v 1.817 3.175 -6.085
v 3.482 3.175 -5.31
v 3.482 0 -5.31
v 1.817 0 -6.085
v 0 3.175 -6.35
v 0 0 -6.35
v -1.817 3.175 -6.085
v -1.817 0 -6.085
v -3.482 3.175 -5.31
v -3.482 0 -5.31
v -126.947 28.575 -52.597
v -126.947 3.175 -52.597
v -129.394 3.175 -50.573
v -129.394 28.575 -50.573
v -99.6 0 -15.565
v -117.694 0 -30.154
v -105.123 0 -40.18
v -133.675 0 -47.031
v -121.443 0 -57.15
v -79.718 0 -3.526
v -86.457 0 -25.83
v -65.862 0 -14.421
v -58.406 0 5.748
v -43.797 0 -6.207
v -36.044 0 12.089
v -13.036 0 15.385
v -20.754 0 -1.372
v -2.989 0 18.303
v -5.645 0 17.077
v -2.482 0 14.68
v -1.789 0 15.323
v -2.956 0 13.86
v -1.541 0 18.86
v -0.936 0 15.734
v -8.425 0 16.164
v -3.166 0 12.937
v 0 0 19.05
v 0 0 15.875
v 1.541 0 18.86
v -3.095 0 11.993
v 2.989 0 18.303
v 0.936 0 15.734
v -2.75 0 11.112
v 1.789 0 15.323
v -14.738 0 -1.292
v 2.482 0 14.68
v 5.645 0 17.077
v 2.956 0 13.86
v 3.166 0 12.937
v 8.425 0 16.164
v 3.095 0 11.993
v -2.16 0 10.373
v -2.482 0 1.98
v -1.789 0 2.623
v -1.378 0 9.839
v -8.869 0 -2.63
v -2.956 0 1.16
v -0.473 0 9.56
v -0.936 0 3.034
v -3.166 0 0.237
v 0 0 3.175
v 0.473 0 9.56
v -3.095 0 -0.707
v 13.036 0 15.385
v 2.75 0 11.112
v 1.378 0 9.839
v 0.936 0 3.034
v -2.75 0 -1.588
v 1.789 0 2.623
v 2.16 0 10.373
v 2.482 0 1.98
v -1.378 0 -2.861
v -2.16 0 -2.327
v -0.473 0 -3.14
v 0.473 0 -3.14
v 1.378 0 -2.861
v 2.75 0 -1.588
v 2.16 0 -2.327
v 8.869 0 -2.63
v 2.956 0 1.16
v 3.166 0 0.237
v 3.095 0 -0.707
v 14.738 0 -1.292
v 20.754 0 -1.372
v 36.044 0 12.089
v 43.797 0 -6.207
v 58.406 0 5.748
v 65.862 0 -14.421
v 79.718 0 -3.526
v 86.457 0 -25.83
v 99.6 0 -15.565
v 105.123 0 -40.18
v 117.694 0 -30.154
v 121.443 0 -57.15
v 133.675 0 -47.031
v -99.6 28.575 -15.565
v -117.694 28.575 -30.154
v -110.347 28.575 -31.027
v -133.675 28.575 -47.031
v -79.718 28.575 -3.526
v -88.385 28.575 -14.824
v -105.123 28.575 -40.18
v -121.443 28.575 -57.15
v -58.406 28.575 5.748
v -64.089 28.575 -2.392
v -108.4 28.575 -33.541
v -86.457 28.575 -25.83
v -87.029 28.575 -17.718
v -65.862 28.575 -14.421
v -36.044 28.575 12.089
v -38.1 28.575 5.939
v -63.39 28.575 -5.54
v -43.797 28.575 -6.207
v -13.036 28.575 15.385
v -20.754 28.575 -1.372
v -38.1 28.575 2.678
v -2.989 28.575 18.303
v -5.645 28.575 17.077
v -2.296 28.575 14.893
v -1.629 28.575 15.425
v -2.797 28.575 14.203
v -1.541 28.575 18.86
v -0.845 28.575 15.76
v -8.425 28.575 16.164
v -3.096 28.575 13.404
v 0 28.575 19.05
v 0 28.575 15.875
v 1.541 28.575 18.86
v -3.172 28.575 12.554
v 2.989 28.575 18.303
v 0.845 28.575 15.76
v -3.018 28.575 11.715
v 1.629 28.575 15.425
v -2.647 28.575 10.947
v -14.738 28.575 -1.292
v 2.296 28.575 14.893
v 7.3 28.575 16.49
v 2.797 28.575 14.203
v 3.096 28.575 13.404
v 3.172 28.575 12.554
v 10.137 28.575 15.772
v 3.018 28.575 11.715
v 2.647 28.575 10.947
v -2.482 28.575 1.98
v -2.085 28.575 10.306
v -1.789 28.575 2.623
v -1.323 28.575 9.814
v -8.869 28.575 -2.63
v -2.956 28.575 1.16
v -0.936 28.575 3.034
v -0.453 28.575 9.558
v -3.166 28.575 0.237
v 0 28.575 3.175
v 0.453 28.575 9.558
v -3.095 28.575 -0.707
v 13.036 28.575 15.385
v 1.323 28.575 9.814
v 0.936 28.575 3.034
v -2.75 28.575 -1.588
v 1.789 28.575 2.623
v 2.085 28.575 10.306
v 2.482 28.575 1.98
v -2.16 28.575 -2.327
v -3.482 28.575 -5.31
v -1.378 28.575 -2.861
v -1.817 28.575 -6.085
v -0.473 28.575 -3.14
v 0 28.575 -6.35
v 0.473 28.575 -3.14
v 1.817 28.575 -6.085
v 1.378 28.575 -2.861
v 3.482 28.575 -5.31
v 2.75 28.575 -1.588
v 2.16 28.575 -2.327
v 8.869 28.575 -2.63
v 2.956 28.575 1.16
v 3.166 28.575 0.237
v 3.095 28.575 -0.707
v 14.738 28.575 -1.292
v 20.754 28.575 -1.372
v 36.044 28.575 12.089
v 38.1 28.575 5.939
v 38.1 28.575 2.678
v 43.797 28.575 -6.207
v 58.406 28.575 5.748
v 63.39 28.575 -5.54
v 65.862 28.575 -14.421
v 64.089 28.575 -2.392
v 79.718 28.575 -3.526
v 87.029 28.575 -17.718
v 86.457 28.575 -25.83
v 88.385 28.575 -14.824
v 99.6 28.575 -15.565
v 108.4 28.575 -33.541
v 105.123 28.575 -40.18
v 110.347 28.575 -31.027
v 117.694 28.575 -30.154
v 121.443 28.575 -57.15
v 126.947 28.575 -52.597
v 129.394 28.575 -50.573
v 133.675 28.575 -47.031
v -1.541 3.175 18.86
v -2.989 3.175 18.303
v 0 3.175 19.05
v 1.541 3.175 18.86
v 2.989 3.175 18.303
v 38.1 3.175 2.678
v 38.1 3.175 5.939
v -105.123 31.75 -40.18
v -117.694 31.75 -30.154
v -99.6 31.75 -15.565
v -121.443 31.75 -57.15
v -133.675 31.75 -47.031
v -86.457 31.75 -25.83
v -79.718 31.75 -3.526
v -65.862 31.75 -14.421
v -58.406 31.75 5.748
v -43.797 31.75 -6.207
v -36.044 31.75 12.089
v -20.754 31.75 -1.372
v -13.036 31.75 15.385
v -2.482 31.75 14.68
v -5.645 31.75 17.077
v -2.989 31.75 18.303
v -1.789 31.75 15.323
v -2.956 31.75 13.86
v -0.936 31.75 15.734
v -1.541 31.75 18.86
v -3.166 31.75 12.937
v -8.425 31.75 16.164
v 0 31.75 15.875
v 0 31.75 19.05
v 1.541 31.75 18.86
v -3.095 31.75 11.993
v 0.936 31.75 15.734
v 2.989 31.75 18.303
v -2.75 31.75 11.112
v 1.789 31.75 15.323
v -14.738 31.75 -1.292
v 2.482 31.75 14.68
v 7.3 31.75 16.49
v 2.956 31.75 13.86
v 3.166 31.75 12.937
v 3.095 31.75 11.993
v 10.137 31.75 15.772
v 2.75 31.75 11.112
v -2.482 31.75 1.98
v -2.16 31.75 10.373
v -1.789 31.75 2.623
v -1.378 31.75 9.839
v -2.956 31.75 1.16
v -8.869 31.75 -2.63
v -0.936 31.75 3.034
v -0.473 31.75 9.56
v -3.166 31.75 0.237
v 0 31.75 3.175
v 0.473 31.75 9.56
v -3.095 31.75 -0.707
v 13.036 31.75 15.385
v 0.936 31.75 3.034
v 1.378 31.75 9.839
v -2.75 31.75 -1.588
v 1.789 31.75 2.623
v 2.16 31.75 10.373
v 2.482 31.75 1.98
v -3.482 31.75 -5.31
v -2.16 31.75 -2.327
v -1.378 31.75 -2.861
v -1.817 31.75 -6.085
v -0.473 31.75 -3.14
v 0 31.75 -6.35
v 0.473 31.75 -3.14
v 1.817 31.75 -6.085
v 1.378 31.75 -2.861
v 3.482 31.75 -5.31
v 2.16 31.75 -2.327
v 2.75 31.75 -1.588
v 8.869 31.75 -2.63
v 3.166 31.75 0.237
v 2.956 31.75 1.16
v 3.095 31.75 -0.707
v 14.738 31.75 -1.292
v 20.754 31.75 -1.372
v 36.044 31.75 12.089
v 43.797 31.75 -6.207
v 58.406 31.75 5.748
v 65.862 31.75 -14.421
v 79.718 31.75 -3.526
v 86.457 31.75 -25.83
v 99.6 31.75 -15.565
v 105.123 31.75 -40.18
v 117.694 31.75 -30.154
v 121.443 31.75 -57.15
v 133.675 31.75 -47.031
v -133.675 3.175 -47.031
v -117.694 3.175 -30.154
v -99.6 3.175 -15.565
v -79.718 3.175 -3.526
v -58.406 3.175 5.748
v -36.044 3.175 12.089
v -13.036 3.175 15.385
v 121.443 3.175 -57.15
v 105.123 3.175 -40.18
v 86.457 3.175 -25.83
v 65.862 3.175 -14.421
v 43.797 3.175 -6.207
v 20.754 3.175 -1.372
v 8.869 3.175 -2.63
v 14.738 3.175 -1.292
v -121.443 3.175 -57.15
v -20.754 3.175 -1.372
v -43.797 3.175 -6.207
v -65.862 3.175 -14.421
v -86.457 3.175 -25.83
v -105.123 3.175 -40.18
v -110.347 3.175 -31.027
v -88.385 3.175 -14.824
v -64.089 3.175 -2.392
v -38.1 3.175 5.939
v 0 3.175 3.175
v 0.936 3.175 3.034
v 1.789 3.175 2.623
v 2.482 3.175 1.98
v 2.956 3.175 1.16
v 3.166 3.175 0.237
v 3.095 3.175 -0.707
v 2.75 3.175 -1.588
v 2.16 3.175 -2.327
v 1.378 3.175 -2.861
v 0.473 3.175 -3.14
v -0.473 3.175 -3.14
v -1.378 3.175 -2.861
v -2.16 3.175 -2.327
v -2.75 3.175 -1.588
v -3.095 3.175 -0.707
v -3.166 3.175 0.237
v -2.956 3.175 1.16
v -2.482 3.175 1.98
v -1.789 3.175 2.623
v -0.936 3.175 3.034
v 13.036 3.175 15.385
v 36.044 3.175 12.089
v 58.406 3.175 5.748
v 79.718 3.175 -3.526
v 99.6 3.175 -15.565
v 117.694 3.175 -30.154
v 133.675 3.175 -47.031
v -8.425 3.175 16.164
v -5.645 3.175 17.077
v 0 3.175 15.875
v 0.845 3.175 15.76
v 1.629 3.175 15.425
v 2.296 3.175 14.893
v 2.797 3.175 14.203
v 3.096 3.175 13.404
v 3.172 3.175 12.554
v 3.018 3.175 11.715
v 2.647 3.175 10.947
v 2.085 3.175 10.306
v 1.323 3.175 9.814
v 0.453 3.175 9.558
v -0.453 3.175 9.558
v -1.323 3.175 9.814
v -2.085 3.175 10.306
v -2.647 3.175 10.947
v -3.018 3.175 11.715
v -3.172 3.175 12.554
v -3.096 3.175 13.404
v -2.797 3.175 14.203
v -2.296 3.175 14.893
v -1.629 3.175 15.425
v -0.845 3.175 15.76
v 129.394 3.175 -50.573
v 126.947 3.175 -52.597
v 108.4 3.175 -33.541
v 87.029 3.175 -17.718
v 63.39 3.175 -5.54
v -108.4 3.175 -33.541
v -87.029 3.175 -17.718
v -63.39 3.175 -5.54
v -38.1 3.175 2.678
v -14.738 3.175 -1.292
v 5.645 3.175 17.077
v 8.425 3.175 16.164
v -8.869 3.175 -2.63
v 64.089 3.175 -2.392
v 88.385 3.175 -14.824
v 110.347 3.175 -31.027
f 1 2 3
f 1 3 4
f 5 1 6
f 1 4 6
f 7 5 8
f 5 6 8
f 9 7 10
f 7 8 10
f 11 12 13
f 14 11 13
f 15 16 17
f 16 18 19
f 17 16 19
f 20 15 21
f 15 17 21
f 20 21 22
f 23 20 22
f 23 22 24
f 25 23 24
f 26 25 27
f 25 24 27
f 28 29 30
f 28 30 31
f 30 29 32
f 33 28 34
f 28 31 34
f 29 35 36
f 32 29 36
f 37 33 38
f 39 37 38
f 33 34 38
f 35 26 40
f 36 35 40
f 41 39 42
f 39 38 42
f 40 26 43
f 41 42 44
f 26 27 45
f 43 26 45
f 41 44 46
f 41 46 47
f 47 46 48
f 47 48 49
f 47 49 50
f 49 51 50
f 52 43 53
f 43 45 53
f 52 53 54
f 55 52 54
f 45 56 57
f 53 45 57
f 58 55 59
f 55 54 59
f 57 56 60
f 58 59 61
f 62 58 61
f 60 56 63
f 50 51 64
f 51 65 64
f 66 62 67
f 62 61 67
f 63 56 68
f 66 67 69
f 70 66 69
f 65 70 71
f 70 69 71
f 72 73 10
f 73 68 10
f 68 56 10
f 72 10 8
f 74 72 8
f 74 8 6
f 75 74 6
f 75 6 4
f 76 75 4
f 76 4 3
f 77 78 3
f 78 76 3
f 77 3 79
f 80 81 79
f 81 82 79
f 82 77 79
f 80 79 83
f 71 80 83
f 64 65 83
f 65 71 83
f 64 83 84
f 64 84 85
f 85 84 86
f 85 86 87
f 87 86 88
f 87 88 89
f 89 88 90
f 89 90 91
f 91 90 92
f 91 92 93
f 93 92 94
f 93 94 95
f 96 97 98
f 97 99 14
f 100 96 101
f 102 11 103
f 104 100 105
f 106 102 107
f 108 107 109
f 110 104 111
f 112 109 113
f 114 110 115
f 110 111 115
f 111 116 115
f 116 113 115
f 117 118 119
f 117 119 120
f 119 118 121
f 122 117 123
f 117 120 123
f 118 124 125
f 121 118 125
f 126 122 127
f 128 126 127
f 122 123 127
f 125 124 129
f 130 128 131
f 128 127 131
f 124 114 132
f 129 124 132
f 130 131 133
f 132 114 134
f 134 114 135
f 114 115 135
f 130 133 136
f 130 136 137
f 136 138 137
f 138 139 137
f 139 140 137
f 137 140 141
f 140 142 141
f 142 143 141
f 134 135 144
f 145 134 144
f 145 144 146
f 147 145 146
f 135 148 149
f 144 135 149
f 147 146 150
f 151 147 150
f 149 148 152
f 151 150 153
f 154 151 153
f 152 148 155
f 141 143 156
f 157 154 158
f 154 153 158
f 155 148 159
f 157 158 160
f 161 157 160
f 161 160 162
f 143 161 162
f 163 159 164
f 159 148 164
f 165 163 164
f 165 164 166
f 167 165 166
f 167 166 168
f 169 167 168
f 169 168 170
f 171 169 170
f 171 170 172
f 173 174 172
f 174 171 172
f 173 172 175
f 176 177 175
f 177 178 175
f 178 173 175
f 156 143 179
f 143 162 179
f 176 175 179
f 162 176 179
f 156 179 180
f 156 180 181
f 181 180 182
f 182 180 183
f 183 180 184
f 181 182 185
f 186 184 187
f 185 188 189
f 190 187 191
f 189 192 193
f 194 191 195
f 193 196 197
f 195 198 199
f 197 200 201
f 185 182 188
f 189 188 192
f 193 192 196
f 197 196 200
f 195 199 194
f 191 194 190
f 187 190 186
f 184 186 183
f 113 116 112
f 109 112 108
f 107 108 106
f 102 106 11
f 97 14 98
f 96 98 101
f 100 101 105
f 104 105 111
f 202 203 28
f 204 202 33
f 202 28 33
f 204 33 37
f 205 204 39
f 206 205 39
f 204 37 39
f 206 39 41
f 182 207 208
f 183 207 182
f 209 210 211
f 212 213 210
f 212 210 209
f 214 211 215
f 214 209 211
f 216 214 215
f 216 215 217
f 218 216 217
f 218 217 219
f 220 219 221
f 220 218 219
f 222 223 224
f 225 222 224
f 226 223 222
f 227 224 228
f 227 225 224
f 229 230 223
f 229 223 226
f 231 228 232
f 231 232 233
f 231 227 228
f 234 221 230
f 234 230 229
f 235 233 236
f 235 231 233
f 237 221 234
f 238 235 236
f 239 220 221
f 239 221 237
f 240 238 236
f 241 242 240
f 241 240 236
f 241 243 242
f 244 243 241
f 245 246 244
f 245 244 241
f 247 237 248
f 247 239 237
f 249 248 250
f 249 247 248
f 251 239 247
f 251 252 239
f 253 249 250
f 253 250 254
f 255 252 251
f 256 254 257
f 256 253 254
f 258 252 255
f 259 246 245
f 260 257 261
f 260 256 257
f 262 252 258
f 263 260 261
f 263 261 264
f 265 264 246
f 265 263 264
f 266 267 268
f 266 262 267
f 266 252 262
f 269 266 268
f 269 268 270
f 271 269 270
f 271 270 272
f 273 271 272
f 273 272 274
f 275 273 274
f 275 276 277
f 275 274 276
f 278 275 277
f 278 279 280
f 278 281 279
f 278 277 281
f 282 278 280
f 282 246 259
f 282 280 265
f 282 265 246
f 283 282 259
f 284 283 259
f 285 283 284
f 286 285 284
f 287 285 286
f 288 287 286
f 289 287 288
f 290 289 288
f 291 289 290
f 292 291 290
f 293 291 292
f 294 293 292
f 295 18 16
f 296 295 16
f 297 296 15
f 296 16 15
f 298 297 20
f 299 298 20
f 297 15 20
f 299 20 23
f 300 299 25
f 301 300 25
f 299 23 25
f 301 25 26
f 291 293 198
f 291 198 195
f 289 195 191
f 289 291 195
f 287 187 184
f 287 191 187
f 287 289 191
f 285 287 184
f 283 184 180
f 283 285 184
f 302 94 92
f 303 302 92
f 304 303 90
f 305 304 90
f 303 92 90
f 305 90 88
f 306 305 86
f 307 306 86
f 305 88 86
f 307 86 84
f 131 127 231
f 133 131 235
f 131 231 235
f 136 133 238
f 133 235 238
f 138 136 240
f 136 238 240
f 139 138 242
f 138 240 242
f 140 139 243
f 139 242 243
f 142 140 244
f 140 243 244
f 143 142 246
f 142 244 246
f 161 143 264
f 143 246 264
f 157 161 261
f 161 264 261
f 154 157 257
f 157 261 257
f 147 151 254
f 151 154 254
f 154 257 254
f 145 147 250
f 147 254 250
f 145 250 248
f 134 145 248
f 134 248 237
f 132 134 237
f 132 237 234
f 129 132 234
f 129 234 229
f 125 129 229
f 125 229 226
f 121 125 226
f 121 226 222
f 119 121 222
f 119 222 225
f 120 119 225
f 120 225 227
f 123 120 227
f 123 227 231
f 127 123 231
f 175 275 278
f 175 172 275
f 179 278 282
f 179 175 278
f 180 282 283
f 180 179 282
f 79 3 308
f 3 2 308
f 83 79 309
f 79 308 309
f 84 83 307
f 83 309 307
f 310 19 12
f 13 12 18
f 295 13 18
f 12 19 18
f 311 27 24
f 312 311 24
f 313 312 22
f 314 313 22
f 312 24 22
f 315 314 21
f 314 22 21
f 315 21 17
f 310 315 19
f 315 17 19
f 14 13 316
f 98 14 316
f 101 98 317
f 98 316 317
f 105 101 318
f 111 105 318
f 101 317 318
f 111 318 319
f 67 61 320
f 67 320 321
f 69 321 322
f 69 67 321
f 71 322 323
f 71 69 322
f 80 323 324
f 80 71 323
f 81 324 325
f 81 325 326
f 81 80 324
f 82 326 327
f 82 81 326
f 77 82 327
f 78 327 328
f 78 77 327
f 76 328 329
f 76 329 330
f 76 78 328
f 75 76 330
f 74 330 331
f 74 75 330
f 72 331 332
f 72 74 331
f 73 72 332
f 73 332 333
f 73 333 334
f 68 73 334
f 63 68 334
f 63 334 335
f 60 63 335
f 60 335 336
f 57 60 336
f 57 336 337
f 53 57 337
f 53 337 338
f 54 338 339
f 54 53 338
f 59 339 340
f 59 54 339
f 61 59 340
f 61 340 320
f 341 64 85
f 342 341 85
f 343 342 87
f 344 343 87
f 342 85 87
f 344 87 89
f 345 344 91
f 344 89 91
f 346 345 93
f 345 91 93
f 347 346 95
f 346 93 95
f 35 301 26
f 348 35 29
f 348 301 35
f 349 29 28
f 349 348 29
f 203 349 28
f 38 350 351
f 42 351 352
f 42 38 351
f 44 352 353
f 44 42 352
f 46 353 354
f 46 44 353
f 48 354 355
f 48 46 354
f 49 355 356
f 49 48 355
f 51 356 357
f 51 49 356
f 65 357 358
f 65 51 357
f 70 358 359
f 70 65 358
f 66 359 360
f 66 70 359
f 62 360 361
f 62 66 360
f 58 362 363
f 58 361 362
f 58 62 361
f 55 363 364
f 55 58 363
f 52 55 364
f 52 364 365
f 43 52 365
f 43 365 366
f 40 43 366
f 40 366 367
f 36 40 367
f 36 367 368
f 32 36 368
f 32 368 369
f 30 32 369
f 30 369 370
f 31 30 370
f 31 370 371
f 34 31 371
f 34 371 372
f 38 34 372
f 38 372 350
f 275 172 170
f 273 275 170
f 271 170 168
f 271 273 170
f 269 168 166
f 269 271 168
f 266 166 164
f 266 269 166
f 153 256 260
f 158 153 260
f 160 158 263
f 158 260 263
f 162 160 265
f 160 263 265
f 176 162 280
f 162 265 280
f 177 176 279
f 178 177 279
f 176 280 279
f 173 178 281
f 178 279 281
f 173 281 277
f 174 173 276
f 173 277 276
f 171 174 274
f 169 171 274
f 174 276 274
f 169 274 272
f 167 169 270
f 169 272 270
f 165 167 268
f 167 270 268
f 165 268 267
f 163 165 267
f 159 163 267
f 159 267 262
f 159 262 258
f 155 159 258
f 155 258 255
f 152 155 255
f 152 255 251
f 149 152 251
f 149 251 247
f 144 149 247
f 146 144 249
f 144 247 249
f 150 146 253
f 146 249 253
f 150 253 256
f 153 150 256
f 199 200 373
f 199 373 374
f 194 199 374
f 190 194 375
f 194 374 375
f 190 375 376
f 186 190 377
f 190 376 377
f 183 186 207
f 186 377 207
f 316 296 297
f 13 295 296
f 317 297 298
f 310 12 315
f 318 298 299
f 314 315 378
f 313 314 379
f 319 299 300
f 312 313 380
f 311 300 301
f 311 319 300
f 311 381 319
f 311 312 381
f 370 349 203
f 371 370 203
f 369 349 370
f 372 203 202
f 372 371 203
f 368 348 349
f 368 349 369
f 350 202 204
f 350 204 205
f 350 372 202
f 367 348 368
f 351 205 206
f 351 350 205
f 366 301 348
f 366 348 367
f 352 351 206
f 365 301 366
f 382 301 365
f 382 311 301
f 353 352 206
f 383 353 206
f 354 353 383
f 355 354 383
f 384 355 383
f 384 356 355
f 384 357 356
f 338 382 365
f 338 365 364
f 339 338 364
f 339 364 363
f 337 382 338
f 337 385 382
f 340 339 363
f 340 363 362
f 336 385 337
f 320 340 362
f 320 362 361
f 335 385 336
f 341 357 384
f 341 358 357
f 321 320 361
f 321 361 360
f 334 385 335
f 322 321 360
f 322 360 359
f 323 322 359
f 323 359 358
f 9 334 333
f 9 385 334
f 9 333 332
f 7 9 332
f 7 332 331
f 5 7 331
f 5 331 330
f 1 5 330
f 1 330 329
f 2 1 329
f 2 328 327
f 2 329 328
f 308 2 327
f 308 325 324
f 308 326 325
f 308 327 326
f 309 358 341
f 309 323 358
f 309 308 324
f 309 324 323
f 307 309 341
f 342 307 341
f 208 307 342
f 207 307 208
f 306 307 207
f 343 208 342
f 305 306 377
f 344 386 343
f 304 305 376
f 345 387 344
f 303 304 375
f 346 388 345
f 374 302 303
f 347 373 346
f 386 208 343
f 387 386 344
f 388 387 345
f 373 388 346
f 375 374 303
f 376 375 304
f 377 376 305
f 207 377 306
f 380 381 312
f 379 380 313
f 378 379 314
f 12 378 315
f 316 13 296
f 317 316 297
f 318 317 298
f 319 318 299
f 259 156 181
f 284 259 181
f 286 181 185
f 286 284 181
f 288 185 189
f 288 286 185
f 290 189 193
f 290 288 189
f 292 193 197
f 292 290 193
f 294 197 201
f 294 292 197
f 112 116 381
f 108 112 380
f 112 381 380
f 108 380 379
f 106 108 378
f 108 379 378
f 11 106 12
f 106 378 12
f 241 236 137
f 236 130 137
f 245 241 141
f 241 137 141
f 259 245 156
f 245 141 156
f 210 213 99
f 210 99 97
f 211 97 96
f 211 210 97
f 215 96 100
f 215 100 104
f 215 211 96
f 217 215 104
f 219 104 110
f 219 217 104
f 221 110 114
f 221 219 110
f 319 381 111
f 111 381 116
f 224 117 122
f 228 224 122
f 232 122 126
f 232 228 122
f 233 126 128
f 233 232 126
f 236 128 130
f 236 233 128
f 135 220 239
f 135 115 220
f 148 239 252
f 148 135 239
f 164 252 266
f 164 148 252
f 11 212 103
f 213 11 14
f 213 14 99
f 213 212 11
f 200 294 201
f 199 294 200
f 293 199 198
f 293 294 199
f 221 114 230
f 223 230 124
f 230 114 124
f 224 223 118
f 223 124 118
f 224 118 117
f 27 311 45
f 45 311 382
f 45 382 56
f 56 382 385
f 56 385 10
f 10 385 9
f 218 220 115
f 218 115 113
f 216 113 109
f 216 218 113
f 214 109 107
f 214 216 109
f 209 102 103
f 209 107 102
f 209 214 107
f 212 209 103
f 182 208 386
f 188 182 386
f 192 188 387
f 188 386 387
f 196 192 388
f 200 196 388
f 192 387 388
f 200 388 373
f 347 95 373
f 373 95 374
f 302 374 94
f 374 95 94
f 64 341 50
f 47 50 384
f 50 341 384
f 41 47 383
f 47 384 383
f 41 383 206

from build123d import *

# Parameters (mm, degrees)
SKETCH1_R           = 3.175
BOSS_EXTRUDE1_DEPTH = 3.175
BOSS_EXTRUDE2_DEPTH = 25.4
FILLET1_R           = 25.4
SKETCH4_W           = 38.1
SKETCH4_H           = 25.4
CUT_EXTRUDE1_DEPTH  = 254


# Read off the part's stored shape, not the designer's step: Boss-Extrude2
with BuildPart() as part:
    # Sketch1 → Boss-Extrude1 (new body)
    with BuildSketch(Plane(origin=(0, 0, 0), x_dir=(1, 0, 0), z_dir=(0, 1, 0))):
        with BuildLine():
            ThreePointArc((-133.675170743, 47.031446414), (-76.370132102, 1.839200867), (-5.549575239, -15.786213647))
            ThreePointArc((-5.549575239, -15.786213647), (0, -19.05), (5.549575239, -15.786213647))
            ThreePointArc((5.549575239, -15.786213647), (76.370132102, 1.839200867), (133.675170743, 47.031446414))
            Line((133.675170743, 47.031446414), (121.442816173, 57.15))
            ThreePointArc((121.442816173, 57.15), (69.968192782, 16.382290944), (6.348711382, 0.127921031))
            ThreePointArc((6.348711382, 0.127921031), (0, 6.35), (-6.348711382, 0.127921031))
            ThreePointArc((-6.348711382, 0.127921031), (-69.968192782, 16.382290944), (-121.442816173, 57.15))
            Line((-121.442816173, 57.15), (-133.675170743, 47.031446414))
        make_face()
        with Locations(Location((0, -12.7, 0), (0, 0, 270))):
            Circle(SKETCH1_R, mode=Mode.SUBTRACT)
        with Locations(Location((0, 0, 0), (0, 0, 270))):
            Circle(SKETCH1_R, mode=Mode.SUBTRACT)
    boss_extrude1 = extrude(amount=BOSS_EXTRUDE1_DEPTH)

    # Boss-Extrude2 outline → Boss-Extrude2 (add)
    with BuildSketch(Plane(origin=(0, 3.175, 0), x_dir=(1, 0, 0), z_dir=(0, 1, 0))):
        with BuildLine():
            ThreePointArc((2.08529156, -10.30580199), (72.444780746, 6.111748406), (129.393846644, 50.572940169))
            Line((129.393846644, 50.572940169), (126.947375729, 52.596650886))
            ThreePointArc((126.947375729, 52.596650886), (0, -7.14375), (-126.947375729, 52.596650886))
            Line((-126.947375729, 52.596650886), (-129.393846644, 50.572940169))
            ThreePointArc((-129.393846644, 50.572940169), (-72.444780746, 6.111748406), (-2.08529156, -10.30580199))
            ThreePointArc((-2.08529156, -10.30580199), (0, -9.525), (2.08529156, -10.30580199))
        make_face()
    extrude(amount=BOSS_EXTRUDE2_DEPTH)

    # Mirror1: Boss-Extrude1 across plane
    add(boss_extrude1.mirror(Plane(origin=(0, 15.875, 0), x_dir=(0, 0, 1), z_dir=(0, -1, 0))))

    # Fillet1
    fillet1_edges = [part.edges().sort_by_distance(p)[0] for p in [
        (-5.549575239, 1.5875, 15.786213647),
        (-6.348711382, 1.5875, -0.127921031),
        (6.348711382, 1.5875, -0.127921031),
        (5.549575239, 1.5875, 15.786213647),
        (5.549575239, 30.1625, 15.786213647),
        (-5.549575239, 30.1625, 15.786213647),
        (-6.348711382, 30.1625, -0.127921031),
        (6.348711382, 30.1625, -0.127921031),
    ]]
    fillet(fillet1_edges, radius=FILLET1_R)

    # Sketch4 → Cut-Extrude1 (cut)
    with BuildSketch(Plane.XY.offset(-52.596650886)):
        with Locations((-19.05, 15.875)):
            Rectangle(SKETCH4_W, SKETCH4_H)
        with Locations((19.05, 15.875)):
            Rectangle(SKETCH4_W, SKETCH4_H)
    extrude(amount=CUT_EXTRUDE1_DEPTH, mode=Mode.SUBTRACT)


solid = part.part
